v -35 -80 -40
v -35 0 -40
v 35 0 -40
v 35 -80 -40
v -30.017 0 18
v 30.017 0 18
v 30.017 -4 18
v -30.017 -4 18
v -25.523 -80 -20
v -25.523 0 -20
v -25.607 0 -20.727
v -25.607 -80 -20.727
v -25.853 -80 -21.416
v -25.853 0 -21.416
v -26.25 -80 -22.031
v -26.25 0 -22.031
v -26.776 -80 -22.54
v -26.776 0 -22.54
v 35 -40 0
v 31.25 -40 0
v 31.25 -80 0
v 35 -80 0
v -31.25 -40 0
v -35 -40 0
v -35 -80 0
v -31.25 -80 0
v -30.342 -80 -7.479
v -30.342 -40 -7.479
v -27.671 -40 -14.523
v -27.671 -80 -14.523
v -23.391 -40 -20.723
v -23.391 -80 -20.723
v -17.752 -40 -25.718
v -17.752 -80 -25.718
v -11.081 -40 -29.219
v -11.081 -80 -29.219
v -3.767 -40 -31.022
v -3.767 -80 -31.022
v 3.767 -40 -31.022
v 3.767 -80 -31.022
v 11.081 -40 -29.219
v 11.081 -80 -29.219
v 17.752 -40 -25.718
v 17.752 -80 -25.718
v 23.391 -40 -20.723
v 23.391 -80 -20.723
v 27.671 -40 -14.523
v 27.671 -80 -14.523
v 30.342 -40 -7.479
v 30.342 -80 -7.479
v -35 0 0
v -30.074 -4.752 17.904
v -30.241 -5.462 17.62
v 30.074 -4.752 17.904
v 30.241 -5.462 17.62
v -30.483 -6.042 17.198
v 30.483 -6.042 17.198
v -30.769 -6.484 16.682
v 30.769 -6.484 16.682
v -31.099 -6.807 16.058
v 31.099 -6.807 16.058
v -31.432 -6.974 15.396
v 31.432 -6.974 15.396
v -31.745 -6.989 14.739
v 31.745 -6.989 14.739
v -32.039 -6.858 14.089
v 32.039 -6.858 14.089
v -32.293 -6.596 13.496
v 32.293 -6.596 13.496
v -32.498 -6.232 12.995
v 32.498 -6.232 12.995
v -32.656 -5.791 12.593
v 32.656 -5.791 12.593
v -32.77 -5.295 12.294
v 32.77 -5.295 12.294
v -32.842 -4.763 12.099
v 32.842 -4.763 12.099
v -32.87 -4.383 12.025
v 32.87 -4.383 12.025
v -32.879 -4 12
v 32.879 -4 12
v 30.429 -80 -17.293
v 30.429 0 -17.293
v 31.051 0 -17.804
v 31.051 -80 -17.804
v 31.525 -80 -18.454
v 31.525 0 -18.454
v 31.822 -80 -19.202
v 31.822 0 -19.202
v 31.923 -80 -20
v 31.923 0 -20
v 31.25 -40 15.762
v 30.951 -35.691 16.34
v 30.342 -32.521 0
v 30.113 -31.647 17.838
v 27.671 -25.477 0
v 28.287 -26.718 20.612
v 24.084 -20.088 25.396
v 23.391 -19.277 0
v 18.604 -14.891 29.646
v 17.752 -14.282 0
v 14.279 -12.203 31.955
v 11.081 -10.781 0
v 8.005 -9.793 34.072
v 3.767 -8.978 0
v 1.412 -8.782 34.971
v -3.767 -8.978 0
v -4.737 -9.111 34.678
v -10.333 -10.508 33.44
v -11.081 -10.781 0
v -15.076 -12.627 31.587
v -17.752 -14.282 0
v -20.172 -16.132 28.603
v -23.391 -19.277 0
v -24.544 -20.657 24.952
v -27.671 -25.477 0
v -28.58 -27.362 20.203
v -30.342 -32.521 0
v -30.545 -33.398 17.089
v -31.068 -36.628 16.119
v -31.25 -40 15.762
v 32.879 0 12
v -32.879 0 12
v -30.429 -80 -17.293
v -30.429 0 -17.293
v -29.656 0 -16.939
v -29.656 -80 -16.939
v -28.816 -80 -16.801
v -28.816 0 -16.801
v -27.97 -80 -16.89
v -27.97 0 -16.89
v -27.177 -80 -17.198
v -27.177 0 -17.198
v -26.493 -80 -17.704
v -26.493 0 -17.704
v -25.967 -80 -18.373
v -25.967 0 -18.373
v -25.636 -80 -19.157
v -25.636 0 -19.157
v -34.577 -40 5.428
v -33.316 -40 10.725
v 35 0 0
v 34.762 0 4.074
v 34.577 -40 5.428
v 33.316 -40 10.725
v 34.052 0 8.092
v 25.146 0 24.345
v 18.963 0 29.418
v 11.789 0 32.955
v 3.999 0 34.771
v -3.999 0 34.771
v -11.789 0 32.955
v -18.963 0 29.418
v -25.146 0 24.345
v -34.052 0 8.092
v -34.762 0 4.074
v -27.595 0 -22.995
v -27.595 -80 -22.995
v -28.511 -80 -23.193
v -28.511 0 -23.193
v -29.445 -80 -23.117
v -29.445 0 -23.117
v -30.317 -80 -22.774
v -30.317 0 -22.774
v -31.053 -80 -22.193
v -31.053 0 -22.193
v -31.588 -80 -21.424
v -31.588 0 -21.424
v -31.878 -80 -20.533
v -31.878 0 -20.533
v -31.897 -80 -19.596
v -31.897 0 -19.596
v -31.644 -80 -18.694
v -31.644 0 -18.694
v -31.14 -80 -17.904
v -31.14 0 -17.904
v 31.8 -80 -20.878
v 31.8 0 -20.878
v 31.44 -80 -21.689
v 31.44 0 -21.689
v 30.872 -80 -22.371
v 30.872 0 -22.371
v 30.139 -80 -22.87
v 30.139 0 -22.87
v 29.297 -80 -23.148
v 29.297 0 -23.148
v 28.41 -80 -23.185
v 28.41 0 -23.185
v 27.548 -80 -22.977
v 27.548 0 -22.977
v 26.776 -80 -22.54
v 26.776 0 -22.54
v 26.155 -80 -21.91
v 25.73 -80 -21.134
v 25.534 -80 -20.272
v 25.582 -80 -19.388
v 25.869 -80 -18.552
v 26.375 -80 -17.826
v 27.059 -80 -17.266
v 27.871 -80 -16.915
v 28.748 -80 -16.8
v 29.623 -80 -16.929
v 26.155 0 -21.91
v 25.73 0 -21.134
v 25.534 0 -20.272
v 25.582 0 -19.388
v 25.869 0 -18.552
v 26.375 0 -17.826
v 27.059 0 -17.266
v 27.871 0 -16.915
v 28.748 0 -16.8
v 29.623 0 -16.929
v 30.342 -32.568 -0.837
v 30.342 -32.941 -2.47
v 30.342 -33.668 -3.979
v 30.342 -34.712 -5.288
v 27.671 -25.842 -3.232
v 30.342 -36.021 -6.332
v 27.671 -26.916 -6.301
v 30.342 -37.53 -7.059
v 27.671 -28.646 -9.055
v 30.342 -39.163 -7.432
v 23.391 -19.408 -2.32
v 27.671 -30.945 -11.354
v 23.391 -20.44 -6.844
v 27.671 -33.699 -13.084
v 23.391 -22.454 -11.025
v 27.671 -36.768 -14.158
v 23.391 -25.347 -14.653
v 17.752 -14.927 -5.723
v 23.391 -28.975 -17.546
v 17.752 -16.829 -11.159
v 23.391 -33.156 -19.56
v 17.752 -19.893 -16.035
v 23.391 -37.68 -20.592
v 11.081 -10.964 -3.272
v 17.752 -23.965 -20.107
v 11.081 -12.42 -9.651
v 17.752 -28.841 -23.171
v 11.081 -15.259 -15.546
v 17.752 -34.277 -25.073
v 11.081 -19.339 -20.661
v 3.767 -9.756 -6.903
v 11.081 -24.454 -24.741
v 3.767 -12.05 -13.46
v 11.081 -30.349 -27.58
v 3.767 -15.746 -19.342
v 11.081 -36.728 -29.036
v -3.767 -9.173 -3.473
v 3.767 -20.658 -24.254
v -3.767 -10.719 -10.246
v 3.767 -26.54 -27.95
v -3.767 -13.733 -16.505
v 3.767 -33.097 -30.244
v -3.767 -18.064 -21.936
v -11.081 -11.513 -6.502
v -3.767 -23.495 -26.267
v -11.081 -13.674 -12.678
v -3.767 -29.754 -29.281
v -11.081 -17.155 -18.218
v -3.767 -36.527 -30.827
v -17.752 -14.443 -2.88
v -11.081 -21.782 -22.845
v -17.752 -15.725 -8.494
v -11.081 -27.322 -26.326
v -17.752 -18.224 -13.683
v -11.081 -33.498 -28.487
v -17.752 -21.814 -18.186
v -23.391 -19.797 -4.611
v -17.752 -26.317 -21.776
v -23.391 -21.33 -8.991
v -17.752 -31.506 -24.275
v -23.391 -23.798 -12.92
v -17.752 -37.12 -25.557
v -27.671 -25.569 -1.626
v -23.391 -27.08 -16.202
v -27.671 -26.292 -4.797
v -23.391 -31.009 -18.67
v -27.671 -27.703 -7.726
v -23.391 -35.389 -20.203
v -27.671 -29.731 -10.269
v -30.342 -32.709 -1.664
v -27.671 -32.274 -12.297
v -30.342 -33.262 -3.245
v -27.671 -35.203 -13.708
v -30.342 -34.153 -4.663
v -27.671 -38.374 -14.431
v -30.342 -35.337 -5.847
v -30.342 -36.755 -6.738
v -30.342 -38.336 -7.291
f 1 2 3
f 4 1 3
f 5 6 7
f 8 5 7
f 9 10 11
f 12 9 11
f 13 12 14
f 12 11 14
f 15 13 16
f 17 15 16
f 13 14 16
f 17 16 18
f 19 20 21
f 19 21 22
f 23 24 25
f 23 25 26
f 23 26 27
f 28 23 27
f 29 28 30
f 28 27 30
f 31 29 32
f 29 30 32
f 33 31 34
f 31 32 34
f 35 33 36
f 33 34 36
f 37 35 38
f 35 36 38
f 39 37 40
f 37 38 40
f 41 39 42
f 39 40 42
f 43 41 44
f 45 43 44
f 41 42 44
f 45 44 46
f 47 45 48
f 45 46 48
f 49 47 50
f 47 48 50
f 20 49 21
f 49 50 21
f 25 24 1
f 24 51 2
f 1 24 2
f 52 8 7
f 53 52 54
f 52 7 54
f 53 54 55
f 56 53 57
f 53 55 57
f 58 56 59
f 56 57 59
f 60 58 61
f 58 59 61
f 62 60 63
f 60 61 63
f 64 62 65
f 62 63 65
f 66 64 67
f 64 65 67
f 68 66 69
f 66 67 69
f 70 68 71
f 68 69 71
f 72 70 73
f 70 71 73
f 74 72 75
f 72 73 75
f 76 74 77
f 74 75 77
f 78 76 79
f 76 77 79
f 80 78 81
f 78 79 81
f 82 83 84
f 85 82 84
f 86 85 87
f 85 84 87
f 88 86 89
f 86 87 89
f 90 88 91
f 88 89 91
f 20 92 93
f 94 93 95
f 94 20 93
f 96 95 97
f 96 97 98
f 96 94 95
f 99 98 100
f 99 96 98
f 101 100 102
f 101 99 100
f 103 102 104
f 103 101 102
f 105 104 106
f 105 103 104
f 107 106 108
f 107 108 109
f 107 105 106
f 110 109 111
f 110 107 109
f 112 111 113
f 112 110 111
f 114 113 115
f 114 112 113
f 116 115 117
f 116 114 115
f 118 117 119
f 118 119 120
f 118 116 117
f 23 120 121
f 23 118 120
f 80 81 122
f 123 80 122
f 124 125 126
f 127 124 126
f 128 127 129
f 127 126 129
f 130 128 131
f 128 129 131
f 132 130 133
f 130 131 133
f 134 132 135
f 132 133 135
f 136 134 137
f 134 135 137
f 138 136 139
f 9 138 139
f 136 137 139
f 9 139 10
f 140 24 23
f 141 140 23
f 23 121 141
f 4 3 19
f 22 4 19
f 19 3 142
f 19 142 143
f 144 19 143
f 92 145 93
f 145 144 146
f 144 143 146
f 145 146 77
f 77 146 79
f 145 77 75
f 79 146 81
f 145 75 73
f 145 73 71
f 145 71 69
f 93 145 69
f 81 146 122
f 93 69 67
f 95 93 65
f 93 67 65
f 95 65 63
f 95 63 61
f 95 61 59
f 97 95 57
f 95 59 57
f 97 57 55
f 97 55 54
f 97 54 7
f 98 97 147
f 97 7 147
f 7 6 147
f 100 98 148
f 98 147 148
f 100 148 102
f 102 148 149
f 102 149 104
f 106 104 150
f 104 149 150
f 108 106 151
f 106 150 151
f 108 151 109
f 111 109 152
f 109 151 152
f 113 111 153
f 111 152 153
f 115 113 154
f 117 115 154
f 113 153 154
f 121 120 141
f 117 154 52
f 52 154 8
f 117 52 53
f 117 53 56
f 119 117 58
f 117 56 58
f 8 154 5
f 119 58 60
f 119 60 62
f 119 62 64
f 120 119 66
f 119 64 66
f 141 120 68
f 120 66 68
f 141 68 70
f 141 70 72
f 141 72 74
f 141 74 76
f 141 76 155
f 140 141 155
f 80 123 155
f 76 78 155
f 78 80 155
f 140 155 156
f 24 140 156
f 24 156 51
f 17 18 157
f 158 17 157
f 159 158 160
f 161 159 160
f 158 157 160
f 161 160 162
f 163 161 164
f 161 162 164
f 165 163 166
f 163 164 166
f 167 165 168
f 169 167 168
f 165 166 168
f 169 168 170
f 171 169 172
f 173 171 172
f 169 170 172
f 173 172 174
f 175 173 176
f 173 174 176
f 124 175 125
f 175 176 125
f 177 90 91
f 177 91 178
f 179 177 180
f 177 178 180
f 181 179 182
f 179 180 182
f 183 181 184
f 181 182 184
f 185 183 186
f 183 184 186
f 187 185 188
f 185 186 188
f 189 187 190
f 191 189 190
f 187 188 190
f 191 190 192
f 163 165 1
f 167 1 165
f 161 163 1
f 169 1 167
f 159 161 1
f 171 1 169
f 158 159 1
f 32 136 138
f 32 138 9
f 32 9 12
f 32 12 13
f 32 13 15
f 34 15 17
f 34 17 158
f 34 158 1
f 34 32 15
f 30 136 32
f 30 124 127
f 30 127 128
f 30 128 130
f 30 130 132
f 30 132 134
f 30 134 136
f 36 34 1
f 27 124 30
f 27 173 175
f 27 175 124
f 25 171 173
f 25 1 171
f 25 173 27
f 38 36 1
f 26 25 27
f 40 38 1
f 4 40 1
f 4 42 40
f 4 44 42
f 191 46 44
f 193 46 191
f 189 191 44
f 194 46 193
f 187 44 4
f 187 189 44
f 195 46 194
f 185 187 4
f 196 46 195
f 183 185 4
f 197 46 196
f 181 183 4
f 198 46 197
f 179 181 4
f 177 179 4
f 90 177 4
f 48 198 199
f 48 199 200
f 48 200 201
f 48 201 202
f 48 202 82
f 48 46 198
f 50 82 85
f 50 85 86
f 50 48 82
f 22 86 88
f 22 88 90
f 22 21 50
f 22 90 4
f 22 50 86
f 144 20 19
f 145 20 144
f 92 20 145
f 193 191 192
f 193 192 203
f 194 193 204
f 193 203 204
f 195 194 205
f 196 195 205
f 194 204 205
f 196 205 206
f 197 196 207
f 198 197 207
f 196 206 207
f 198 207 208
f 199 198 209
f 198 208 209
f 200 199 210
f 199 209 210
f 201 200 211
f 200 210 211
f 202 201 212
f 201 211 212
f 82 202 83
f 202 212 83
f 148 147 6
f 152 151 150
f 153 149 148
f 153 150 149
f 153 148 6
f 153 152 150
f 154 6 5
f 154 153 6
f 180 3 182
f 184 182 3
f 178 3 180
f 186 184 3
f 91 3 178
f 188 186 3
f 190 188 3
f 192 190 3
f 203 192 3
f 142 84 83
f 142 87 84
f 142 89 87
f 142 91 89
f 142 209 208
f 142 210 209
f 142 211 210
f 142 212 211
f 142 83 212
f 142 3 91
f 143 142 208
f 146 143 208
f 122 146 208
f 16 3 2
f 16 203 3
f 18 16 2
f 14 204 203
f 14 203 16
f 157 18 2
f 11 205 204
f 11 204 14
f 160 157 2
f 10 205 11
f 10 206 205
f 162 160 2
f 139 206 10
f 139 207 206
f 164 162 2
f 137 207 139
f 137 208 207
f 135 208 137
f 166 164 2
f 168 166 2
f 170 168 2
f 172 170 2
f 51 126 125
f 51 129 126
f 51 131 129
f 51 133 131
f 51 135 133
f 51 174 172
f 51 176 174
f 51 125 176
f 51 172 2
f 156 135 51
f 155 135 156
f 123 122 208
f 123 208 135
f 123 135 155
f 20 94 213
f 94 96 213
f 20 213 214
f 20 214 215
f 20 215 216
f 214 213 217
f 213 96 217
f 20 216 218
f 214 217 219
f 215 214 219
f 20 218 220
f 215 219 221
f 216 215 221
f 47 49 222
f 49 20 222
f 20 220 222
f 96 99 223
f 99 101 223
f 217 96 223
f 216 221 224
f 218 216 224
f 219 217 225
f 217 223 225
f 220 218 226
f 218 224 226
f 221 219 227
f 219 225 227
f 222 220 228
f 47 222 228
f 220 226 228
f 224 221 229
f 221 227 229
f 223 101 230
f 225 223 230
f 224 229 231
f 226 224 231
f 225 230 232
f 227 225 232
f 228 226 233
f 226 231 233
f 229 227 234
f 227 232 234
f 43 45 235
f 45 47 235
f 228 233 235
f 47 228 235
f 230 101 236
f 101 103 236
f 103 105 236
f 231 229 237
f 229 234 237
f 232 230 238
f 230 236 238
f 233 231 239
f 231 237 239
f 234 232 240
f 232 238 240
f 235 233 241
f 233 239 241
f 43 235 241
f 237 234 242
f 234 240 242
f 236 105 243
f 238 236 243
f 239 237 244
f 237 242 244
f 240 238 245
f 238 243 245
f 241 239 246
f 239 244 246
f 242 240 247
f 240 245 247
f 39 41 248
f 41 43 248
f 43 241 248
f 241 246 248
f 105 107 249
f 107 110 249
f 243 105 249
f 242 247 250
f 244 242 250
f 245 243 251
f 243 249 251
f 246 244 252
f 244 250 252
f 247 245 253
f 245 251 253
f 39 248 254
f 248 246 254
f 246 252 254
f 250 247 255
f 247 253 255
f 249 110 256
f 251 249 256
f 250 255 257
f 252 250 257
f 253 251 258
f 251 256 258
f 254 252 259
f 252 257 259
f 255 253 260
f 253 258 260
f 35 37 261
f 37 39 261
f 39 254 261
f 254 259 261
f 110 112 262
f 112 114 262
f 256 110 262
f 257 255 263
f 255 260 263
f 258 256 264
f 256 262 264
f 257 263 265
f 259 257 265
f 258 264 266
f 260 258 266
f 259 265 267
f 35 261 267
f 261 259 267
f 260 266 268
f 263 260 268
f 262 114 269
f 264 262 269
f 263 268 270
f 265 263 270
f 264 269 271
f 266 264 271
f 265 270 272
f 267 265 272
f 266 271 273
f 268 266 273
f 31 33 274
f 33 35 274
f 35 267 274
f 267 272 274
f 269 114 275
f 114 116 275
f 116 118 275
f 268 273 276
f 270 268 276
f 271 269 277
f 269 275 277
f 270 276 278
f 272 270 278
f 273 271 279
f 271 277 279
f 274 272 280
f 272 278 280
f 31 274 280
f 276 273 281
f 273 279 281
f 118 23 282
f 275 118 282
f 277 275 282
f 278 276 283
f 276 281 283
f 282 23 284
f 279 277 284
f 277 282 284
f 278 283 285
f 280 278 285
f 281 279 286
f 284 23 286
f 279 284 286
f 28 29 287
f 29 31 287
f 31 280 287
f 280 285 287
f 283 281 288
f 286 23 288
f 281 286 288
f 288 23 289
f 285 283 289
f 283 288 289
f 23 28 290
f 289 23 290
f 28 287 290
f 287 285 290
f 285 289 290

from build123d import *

# Parameters (mm, degrees)
F1_DEPTH  = 80
F3_DEPTH  = 40
F5_R      = 31.25
F6_DEPTH  = 50.2
F7_ANGLE  = 90
F9_DEPTH  = 4
F10_DEPTH = 4
F12_DEPTH = 67.8795645455


with BuildPart() as f1:
    # F0 (on Front) → F1 (new body)
    with BuildSketch(Plane.XZ):
        with BuildLine():
            ThreePointArc((30.4294233557, -17.2930678088), (33.8380689272, -8.9434384481), (35, 0))
            ThreePointArc((35, 0), (0, 35), (-35, 0))
            ThreePointArc((-35, 0), (-33.8380689272, -8.9434384481), (-30.4294233557, -17.2930678088))
            ThreePointArc((-30.4294233557, -17.2930678088), (-27.1770371159, -17.1981120299), (-25.5228132327, -20))
            ThreePointArc((-25.5228132327, -20), (-25.8531904298, -21.4160737865), (-26.7761038382, -22.5397485178))
            ThreePointArc((-26.7761038382, -22.5397485178), (0, -35), (26.7761038382, -22.5397485178))
            ThreePointArc((26.7761038382, -22.5397485178), (26.0967274514, -18.1714285714), (30.4294233557, -17.2930678088))
        make_face()
        with BuildLine():
            Line((35, -40), (35, 0))
            ThreePointArc((35, 0), (33.8380689272, -8.9434384481), (30.4294233557, -17.2930678088))
            ThreePointArc((30.4294233557, -17.2930678088), (31.5247012028, -18.4542238832), (31.9228132327, -20))
            ThreePointArc((31.9228132327, -20), (30.1388870192, -22.8696228029), (26.7761038382, -22.5397485178))
            ThreePointArc((26.7761038382, -22.5397485178), (0, -35), (-26.7761038382, -22.5397485178))
            ThreePointArc((-26.7761038382, -22.5397485178), (-31.348899014, -21.8285714286), (-30.4294233557, -17.2930678088))
            ThreePointArc((-30.4294233557, -17.2930678088), (-33.8380689272, -8.9434384481), (-35, 0))
            Line((-35, 0), (-35, -40))
            Line((-35, -40), (35, -40))
        make_face()
    extrude(amount=F1_DEPTH)

    # F2 (on face) → F3 (cut)
    with BuildSketch(Plane.XZ.offset(80)):
        with BuildLine():
            ThreePointArc((-31.25, 0), (0, -31.25), (31.25, 0))
            ThreePointArc((31.25, 0), (0, 31.25), (-31.25, 0))
        make_face()
        with BuildLine():
            ThreePointArc((-31.25, 0), (0, 31.25), (31.25, 0))
            Line((31.25, 0), (35, 0))
            ThreePointArc((35, 0), (0, 35), (-35, 0))
            Line((-35, 0), (-31.25, 0))
        make_face()
    extrude(amount=-F3_DEPTH, mode=Mode.SUBTRACT)

    # F5 (on offset) → F6 (cut)
    with BuildSketch(Plane.XY):
        with Locations((0, -40)):
            Circle(F5_R)
    extrude(amount=F6_DEPTH, mode=Mode.SUBTRACT)

    # F6_face (on face) → F7 (revolve, cut)
    with BuildSketch(Plane(origin=(0, -26.7370880757, 0), x_dir=(1, 0, 0), z_dir=(0, 0, 1))):
        with BuildLine():
            Line((-31.25, -13.2629119243), (31.25, -13.2629119243))
            ThreePointArc((31.25, -13.2629119243), (0, 17.9870880757), (-31.25, -13.2629119243))
        make_face()
    revolve(axis=Axis((0, -40, 0), (-1, 0, 0)), revolution_arc=F7_ANGLE, mode=Mode.SUBTRACT)

    # F8 (on face) → F9 (cut)
    with BuildSketch(Plane(origin=(0, 0, 0), x_dir=(-1, 0, 0), z_dir=(0, 1, 0))):
        Polygon((-32.8785644455, 18), (-32.8785644455, 12), (0, 12), (32.8785644455, 12), (32.8785644455, 18), align=None)
    extrude(amount=-F9_DEPTH, mode=Mode.SUBTRACT)

    # F8 (on face) → F10 (join)
    with BuildSketch(Plane(origin=(0, 0, 0), x_dir=(-1, 0, 0), z_dir=(0, 1, 0))):
        Polygon((-32.8785644455, 18), (-32.8785644455, 12), (0, 12), (32.8785644455, 12), (32.8785644455, 18), align=None)
    extrude(amount=-F10_DEPTH)

    # F11 (on face) → F12 (cut, through all)
    with BuildSketch(Plane.YZ.offset(32.8785644455)):
        with BuildLine():
            ThreePointArc((-4, 18), (-7, 15), (-4, 12))
            Line((-4, 12), (0, 12))
            Line((0, 12), (0, 18))
            Line((0, 18), (-4, 18))
        make_face()
    extrude(amount=-F12_DEPTH, mode=Mode.SUBTRACT)


solid = f1.part
